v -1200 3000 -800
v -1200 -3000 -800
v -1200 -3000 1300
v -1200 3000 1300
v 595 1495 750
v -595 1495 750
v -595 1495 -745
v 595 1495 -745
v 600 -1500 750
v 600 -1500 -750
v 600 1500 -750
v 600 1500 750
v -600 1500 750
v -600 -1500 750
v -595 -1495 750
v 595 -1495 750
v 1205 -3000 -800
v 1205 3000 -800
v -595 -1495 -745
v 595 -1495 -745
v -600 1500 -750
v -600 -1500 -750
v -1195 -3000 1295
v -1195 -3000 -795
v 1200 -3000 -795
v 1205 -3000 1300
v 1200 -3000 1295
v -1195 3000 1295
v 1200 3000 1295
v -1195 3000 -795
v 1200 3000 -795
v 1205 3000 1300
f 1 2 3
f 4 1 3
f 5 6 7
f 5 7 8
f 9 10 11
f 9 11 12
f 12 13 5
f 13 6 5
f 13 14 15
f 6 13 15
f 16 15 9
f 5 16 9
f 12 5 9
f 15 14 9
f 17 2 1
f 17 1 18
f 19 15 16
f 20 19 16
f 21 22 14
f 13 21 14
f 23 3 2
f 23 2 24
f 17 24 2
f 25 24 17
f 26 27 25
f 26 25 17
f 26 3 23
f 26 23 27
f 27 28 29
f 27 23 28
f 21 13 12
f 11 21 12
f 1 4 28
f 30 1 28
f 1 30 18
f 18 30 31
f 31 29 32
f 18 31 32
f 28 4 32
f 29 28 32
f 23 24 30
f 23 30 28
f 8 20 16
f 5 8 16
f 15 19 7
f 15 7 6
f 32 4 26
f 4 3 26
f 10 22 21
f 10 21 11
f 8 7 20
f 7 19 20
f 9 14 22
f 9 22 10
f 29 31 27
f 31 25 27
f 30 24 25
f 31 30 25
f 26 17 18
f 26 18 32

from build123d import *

# Parameters (mm, degrees)
F0_W     = 1200
F0_H     = 1500
F1_DEPTH = 1500
F2_T     = -5
F3_W     = 2405
F3_H     = 2100
F3_W_2   = 2395
F3_H_2   = 2090
F4_DEPTH = 3000


with BuildPart() as f1:
    # F0 (on Front) → F1 (new body, symmetric)
    with BuildSketch(Plane.XZ):
        Rectangle(F0_W, F0_H)
    extrude(amount=F1_DEPTH, both=True)

    # F2
    f2_openings = [f1.faces().sort_by_distance(p)[0] for p in [
        (0, 0, 750),
    ]]
    offset(amount=F2_T, openings=f2_openings)


with BuildPart() as f4:
    # F3 (on Front) → F4 (new body, symmetric)
    with BuildSketch(Plane.XZ):
        with Locations((2.5, 250)):
            Rectangle(F3_W, F3_H)
        with Locations((2.5, 250)):
            Rectangle(F3_W_2, F3_H_2, mode=Mode.SUBTRACT)
    extrude(amount=F4_DEPTH, both=True)


solid = Compound([f1.part, f4.part])
